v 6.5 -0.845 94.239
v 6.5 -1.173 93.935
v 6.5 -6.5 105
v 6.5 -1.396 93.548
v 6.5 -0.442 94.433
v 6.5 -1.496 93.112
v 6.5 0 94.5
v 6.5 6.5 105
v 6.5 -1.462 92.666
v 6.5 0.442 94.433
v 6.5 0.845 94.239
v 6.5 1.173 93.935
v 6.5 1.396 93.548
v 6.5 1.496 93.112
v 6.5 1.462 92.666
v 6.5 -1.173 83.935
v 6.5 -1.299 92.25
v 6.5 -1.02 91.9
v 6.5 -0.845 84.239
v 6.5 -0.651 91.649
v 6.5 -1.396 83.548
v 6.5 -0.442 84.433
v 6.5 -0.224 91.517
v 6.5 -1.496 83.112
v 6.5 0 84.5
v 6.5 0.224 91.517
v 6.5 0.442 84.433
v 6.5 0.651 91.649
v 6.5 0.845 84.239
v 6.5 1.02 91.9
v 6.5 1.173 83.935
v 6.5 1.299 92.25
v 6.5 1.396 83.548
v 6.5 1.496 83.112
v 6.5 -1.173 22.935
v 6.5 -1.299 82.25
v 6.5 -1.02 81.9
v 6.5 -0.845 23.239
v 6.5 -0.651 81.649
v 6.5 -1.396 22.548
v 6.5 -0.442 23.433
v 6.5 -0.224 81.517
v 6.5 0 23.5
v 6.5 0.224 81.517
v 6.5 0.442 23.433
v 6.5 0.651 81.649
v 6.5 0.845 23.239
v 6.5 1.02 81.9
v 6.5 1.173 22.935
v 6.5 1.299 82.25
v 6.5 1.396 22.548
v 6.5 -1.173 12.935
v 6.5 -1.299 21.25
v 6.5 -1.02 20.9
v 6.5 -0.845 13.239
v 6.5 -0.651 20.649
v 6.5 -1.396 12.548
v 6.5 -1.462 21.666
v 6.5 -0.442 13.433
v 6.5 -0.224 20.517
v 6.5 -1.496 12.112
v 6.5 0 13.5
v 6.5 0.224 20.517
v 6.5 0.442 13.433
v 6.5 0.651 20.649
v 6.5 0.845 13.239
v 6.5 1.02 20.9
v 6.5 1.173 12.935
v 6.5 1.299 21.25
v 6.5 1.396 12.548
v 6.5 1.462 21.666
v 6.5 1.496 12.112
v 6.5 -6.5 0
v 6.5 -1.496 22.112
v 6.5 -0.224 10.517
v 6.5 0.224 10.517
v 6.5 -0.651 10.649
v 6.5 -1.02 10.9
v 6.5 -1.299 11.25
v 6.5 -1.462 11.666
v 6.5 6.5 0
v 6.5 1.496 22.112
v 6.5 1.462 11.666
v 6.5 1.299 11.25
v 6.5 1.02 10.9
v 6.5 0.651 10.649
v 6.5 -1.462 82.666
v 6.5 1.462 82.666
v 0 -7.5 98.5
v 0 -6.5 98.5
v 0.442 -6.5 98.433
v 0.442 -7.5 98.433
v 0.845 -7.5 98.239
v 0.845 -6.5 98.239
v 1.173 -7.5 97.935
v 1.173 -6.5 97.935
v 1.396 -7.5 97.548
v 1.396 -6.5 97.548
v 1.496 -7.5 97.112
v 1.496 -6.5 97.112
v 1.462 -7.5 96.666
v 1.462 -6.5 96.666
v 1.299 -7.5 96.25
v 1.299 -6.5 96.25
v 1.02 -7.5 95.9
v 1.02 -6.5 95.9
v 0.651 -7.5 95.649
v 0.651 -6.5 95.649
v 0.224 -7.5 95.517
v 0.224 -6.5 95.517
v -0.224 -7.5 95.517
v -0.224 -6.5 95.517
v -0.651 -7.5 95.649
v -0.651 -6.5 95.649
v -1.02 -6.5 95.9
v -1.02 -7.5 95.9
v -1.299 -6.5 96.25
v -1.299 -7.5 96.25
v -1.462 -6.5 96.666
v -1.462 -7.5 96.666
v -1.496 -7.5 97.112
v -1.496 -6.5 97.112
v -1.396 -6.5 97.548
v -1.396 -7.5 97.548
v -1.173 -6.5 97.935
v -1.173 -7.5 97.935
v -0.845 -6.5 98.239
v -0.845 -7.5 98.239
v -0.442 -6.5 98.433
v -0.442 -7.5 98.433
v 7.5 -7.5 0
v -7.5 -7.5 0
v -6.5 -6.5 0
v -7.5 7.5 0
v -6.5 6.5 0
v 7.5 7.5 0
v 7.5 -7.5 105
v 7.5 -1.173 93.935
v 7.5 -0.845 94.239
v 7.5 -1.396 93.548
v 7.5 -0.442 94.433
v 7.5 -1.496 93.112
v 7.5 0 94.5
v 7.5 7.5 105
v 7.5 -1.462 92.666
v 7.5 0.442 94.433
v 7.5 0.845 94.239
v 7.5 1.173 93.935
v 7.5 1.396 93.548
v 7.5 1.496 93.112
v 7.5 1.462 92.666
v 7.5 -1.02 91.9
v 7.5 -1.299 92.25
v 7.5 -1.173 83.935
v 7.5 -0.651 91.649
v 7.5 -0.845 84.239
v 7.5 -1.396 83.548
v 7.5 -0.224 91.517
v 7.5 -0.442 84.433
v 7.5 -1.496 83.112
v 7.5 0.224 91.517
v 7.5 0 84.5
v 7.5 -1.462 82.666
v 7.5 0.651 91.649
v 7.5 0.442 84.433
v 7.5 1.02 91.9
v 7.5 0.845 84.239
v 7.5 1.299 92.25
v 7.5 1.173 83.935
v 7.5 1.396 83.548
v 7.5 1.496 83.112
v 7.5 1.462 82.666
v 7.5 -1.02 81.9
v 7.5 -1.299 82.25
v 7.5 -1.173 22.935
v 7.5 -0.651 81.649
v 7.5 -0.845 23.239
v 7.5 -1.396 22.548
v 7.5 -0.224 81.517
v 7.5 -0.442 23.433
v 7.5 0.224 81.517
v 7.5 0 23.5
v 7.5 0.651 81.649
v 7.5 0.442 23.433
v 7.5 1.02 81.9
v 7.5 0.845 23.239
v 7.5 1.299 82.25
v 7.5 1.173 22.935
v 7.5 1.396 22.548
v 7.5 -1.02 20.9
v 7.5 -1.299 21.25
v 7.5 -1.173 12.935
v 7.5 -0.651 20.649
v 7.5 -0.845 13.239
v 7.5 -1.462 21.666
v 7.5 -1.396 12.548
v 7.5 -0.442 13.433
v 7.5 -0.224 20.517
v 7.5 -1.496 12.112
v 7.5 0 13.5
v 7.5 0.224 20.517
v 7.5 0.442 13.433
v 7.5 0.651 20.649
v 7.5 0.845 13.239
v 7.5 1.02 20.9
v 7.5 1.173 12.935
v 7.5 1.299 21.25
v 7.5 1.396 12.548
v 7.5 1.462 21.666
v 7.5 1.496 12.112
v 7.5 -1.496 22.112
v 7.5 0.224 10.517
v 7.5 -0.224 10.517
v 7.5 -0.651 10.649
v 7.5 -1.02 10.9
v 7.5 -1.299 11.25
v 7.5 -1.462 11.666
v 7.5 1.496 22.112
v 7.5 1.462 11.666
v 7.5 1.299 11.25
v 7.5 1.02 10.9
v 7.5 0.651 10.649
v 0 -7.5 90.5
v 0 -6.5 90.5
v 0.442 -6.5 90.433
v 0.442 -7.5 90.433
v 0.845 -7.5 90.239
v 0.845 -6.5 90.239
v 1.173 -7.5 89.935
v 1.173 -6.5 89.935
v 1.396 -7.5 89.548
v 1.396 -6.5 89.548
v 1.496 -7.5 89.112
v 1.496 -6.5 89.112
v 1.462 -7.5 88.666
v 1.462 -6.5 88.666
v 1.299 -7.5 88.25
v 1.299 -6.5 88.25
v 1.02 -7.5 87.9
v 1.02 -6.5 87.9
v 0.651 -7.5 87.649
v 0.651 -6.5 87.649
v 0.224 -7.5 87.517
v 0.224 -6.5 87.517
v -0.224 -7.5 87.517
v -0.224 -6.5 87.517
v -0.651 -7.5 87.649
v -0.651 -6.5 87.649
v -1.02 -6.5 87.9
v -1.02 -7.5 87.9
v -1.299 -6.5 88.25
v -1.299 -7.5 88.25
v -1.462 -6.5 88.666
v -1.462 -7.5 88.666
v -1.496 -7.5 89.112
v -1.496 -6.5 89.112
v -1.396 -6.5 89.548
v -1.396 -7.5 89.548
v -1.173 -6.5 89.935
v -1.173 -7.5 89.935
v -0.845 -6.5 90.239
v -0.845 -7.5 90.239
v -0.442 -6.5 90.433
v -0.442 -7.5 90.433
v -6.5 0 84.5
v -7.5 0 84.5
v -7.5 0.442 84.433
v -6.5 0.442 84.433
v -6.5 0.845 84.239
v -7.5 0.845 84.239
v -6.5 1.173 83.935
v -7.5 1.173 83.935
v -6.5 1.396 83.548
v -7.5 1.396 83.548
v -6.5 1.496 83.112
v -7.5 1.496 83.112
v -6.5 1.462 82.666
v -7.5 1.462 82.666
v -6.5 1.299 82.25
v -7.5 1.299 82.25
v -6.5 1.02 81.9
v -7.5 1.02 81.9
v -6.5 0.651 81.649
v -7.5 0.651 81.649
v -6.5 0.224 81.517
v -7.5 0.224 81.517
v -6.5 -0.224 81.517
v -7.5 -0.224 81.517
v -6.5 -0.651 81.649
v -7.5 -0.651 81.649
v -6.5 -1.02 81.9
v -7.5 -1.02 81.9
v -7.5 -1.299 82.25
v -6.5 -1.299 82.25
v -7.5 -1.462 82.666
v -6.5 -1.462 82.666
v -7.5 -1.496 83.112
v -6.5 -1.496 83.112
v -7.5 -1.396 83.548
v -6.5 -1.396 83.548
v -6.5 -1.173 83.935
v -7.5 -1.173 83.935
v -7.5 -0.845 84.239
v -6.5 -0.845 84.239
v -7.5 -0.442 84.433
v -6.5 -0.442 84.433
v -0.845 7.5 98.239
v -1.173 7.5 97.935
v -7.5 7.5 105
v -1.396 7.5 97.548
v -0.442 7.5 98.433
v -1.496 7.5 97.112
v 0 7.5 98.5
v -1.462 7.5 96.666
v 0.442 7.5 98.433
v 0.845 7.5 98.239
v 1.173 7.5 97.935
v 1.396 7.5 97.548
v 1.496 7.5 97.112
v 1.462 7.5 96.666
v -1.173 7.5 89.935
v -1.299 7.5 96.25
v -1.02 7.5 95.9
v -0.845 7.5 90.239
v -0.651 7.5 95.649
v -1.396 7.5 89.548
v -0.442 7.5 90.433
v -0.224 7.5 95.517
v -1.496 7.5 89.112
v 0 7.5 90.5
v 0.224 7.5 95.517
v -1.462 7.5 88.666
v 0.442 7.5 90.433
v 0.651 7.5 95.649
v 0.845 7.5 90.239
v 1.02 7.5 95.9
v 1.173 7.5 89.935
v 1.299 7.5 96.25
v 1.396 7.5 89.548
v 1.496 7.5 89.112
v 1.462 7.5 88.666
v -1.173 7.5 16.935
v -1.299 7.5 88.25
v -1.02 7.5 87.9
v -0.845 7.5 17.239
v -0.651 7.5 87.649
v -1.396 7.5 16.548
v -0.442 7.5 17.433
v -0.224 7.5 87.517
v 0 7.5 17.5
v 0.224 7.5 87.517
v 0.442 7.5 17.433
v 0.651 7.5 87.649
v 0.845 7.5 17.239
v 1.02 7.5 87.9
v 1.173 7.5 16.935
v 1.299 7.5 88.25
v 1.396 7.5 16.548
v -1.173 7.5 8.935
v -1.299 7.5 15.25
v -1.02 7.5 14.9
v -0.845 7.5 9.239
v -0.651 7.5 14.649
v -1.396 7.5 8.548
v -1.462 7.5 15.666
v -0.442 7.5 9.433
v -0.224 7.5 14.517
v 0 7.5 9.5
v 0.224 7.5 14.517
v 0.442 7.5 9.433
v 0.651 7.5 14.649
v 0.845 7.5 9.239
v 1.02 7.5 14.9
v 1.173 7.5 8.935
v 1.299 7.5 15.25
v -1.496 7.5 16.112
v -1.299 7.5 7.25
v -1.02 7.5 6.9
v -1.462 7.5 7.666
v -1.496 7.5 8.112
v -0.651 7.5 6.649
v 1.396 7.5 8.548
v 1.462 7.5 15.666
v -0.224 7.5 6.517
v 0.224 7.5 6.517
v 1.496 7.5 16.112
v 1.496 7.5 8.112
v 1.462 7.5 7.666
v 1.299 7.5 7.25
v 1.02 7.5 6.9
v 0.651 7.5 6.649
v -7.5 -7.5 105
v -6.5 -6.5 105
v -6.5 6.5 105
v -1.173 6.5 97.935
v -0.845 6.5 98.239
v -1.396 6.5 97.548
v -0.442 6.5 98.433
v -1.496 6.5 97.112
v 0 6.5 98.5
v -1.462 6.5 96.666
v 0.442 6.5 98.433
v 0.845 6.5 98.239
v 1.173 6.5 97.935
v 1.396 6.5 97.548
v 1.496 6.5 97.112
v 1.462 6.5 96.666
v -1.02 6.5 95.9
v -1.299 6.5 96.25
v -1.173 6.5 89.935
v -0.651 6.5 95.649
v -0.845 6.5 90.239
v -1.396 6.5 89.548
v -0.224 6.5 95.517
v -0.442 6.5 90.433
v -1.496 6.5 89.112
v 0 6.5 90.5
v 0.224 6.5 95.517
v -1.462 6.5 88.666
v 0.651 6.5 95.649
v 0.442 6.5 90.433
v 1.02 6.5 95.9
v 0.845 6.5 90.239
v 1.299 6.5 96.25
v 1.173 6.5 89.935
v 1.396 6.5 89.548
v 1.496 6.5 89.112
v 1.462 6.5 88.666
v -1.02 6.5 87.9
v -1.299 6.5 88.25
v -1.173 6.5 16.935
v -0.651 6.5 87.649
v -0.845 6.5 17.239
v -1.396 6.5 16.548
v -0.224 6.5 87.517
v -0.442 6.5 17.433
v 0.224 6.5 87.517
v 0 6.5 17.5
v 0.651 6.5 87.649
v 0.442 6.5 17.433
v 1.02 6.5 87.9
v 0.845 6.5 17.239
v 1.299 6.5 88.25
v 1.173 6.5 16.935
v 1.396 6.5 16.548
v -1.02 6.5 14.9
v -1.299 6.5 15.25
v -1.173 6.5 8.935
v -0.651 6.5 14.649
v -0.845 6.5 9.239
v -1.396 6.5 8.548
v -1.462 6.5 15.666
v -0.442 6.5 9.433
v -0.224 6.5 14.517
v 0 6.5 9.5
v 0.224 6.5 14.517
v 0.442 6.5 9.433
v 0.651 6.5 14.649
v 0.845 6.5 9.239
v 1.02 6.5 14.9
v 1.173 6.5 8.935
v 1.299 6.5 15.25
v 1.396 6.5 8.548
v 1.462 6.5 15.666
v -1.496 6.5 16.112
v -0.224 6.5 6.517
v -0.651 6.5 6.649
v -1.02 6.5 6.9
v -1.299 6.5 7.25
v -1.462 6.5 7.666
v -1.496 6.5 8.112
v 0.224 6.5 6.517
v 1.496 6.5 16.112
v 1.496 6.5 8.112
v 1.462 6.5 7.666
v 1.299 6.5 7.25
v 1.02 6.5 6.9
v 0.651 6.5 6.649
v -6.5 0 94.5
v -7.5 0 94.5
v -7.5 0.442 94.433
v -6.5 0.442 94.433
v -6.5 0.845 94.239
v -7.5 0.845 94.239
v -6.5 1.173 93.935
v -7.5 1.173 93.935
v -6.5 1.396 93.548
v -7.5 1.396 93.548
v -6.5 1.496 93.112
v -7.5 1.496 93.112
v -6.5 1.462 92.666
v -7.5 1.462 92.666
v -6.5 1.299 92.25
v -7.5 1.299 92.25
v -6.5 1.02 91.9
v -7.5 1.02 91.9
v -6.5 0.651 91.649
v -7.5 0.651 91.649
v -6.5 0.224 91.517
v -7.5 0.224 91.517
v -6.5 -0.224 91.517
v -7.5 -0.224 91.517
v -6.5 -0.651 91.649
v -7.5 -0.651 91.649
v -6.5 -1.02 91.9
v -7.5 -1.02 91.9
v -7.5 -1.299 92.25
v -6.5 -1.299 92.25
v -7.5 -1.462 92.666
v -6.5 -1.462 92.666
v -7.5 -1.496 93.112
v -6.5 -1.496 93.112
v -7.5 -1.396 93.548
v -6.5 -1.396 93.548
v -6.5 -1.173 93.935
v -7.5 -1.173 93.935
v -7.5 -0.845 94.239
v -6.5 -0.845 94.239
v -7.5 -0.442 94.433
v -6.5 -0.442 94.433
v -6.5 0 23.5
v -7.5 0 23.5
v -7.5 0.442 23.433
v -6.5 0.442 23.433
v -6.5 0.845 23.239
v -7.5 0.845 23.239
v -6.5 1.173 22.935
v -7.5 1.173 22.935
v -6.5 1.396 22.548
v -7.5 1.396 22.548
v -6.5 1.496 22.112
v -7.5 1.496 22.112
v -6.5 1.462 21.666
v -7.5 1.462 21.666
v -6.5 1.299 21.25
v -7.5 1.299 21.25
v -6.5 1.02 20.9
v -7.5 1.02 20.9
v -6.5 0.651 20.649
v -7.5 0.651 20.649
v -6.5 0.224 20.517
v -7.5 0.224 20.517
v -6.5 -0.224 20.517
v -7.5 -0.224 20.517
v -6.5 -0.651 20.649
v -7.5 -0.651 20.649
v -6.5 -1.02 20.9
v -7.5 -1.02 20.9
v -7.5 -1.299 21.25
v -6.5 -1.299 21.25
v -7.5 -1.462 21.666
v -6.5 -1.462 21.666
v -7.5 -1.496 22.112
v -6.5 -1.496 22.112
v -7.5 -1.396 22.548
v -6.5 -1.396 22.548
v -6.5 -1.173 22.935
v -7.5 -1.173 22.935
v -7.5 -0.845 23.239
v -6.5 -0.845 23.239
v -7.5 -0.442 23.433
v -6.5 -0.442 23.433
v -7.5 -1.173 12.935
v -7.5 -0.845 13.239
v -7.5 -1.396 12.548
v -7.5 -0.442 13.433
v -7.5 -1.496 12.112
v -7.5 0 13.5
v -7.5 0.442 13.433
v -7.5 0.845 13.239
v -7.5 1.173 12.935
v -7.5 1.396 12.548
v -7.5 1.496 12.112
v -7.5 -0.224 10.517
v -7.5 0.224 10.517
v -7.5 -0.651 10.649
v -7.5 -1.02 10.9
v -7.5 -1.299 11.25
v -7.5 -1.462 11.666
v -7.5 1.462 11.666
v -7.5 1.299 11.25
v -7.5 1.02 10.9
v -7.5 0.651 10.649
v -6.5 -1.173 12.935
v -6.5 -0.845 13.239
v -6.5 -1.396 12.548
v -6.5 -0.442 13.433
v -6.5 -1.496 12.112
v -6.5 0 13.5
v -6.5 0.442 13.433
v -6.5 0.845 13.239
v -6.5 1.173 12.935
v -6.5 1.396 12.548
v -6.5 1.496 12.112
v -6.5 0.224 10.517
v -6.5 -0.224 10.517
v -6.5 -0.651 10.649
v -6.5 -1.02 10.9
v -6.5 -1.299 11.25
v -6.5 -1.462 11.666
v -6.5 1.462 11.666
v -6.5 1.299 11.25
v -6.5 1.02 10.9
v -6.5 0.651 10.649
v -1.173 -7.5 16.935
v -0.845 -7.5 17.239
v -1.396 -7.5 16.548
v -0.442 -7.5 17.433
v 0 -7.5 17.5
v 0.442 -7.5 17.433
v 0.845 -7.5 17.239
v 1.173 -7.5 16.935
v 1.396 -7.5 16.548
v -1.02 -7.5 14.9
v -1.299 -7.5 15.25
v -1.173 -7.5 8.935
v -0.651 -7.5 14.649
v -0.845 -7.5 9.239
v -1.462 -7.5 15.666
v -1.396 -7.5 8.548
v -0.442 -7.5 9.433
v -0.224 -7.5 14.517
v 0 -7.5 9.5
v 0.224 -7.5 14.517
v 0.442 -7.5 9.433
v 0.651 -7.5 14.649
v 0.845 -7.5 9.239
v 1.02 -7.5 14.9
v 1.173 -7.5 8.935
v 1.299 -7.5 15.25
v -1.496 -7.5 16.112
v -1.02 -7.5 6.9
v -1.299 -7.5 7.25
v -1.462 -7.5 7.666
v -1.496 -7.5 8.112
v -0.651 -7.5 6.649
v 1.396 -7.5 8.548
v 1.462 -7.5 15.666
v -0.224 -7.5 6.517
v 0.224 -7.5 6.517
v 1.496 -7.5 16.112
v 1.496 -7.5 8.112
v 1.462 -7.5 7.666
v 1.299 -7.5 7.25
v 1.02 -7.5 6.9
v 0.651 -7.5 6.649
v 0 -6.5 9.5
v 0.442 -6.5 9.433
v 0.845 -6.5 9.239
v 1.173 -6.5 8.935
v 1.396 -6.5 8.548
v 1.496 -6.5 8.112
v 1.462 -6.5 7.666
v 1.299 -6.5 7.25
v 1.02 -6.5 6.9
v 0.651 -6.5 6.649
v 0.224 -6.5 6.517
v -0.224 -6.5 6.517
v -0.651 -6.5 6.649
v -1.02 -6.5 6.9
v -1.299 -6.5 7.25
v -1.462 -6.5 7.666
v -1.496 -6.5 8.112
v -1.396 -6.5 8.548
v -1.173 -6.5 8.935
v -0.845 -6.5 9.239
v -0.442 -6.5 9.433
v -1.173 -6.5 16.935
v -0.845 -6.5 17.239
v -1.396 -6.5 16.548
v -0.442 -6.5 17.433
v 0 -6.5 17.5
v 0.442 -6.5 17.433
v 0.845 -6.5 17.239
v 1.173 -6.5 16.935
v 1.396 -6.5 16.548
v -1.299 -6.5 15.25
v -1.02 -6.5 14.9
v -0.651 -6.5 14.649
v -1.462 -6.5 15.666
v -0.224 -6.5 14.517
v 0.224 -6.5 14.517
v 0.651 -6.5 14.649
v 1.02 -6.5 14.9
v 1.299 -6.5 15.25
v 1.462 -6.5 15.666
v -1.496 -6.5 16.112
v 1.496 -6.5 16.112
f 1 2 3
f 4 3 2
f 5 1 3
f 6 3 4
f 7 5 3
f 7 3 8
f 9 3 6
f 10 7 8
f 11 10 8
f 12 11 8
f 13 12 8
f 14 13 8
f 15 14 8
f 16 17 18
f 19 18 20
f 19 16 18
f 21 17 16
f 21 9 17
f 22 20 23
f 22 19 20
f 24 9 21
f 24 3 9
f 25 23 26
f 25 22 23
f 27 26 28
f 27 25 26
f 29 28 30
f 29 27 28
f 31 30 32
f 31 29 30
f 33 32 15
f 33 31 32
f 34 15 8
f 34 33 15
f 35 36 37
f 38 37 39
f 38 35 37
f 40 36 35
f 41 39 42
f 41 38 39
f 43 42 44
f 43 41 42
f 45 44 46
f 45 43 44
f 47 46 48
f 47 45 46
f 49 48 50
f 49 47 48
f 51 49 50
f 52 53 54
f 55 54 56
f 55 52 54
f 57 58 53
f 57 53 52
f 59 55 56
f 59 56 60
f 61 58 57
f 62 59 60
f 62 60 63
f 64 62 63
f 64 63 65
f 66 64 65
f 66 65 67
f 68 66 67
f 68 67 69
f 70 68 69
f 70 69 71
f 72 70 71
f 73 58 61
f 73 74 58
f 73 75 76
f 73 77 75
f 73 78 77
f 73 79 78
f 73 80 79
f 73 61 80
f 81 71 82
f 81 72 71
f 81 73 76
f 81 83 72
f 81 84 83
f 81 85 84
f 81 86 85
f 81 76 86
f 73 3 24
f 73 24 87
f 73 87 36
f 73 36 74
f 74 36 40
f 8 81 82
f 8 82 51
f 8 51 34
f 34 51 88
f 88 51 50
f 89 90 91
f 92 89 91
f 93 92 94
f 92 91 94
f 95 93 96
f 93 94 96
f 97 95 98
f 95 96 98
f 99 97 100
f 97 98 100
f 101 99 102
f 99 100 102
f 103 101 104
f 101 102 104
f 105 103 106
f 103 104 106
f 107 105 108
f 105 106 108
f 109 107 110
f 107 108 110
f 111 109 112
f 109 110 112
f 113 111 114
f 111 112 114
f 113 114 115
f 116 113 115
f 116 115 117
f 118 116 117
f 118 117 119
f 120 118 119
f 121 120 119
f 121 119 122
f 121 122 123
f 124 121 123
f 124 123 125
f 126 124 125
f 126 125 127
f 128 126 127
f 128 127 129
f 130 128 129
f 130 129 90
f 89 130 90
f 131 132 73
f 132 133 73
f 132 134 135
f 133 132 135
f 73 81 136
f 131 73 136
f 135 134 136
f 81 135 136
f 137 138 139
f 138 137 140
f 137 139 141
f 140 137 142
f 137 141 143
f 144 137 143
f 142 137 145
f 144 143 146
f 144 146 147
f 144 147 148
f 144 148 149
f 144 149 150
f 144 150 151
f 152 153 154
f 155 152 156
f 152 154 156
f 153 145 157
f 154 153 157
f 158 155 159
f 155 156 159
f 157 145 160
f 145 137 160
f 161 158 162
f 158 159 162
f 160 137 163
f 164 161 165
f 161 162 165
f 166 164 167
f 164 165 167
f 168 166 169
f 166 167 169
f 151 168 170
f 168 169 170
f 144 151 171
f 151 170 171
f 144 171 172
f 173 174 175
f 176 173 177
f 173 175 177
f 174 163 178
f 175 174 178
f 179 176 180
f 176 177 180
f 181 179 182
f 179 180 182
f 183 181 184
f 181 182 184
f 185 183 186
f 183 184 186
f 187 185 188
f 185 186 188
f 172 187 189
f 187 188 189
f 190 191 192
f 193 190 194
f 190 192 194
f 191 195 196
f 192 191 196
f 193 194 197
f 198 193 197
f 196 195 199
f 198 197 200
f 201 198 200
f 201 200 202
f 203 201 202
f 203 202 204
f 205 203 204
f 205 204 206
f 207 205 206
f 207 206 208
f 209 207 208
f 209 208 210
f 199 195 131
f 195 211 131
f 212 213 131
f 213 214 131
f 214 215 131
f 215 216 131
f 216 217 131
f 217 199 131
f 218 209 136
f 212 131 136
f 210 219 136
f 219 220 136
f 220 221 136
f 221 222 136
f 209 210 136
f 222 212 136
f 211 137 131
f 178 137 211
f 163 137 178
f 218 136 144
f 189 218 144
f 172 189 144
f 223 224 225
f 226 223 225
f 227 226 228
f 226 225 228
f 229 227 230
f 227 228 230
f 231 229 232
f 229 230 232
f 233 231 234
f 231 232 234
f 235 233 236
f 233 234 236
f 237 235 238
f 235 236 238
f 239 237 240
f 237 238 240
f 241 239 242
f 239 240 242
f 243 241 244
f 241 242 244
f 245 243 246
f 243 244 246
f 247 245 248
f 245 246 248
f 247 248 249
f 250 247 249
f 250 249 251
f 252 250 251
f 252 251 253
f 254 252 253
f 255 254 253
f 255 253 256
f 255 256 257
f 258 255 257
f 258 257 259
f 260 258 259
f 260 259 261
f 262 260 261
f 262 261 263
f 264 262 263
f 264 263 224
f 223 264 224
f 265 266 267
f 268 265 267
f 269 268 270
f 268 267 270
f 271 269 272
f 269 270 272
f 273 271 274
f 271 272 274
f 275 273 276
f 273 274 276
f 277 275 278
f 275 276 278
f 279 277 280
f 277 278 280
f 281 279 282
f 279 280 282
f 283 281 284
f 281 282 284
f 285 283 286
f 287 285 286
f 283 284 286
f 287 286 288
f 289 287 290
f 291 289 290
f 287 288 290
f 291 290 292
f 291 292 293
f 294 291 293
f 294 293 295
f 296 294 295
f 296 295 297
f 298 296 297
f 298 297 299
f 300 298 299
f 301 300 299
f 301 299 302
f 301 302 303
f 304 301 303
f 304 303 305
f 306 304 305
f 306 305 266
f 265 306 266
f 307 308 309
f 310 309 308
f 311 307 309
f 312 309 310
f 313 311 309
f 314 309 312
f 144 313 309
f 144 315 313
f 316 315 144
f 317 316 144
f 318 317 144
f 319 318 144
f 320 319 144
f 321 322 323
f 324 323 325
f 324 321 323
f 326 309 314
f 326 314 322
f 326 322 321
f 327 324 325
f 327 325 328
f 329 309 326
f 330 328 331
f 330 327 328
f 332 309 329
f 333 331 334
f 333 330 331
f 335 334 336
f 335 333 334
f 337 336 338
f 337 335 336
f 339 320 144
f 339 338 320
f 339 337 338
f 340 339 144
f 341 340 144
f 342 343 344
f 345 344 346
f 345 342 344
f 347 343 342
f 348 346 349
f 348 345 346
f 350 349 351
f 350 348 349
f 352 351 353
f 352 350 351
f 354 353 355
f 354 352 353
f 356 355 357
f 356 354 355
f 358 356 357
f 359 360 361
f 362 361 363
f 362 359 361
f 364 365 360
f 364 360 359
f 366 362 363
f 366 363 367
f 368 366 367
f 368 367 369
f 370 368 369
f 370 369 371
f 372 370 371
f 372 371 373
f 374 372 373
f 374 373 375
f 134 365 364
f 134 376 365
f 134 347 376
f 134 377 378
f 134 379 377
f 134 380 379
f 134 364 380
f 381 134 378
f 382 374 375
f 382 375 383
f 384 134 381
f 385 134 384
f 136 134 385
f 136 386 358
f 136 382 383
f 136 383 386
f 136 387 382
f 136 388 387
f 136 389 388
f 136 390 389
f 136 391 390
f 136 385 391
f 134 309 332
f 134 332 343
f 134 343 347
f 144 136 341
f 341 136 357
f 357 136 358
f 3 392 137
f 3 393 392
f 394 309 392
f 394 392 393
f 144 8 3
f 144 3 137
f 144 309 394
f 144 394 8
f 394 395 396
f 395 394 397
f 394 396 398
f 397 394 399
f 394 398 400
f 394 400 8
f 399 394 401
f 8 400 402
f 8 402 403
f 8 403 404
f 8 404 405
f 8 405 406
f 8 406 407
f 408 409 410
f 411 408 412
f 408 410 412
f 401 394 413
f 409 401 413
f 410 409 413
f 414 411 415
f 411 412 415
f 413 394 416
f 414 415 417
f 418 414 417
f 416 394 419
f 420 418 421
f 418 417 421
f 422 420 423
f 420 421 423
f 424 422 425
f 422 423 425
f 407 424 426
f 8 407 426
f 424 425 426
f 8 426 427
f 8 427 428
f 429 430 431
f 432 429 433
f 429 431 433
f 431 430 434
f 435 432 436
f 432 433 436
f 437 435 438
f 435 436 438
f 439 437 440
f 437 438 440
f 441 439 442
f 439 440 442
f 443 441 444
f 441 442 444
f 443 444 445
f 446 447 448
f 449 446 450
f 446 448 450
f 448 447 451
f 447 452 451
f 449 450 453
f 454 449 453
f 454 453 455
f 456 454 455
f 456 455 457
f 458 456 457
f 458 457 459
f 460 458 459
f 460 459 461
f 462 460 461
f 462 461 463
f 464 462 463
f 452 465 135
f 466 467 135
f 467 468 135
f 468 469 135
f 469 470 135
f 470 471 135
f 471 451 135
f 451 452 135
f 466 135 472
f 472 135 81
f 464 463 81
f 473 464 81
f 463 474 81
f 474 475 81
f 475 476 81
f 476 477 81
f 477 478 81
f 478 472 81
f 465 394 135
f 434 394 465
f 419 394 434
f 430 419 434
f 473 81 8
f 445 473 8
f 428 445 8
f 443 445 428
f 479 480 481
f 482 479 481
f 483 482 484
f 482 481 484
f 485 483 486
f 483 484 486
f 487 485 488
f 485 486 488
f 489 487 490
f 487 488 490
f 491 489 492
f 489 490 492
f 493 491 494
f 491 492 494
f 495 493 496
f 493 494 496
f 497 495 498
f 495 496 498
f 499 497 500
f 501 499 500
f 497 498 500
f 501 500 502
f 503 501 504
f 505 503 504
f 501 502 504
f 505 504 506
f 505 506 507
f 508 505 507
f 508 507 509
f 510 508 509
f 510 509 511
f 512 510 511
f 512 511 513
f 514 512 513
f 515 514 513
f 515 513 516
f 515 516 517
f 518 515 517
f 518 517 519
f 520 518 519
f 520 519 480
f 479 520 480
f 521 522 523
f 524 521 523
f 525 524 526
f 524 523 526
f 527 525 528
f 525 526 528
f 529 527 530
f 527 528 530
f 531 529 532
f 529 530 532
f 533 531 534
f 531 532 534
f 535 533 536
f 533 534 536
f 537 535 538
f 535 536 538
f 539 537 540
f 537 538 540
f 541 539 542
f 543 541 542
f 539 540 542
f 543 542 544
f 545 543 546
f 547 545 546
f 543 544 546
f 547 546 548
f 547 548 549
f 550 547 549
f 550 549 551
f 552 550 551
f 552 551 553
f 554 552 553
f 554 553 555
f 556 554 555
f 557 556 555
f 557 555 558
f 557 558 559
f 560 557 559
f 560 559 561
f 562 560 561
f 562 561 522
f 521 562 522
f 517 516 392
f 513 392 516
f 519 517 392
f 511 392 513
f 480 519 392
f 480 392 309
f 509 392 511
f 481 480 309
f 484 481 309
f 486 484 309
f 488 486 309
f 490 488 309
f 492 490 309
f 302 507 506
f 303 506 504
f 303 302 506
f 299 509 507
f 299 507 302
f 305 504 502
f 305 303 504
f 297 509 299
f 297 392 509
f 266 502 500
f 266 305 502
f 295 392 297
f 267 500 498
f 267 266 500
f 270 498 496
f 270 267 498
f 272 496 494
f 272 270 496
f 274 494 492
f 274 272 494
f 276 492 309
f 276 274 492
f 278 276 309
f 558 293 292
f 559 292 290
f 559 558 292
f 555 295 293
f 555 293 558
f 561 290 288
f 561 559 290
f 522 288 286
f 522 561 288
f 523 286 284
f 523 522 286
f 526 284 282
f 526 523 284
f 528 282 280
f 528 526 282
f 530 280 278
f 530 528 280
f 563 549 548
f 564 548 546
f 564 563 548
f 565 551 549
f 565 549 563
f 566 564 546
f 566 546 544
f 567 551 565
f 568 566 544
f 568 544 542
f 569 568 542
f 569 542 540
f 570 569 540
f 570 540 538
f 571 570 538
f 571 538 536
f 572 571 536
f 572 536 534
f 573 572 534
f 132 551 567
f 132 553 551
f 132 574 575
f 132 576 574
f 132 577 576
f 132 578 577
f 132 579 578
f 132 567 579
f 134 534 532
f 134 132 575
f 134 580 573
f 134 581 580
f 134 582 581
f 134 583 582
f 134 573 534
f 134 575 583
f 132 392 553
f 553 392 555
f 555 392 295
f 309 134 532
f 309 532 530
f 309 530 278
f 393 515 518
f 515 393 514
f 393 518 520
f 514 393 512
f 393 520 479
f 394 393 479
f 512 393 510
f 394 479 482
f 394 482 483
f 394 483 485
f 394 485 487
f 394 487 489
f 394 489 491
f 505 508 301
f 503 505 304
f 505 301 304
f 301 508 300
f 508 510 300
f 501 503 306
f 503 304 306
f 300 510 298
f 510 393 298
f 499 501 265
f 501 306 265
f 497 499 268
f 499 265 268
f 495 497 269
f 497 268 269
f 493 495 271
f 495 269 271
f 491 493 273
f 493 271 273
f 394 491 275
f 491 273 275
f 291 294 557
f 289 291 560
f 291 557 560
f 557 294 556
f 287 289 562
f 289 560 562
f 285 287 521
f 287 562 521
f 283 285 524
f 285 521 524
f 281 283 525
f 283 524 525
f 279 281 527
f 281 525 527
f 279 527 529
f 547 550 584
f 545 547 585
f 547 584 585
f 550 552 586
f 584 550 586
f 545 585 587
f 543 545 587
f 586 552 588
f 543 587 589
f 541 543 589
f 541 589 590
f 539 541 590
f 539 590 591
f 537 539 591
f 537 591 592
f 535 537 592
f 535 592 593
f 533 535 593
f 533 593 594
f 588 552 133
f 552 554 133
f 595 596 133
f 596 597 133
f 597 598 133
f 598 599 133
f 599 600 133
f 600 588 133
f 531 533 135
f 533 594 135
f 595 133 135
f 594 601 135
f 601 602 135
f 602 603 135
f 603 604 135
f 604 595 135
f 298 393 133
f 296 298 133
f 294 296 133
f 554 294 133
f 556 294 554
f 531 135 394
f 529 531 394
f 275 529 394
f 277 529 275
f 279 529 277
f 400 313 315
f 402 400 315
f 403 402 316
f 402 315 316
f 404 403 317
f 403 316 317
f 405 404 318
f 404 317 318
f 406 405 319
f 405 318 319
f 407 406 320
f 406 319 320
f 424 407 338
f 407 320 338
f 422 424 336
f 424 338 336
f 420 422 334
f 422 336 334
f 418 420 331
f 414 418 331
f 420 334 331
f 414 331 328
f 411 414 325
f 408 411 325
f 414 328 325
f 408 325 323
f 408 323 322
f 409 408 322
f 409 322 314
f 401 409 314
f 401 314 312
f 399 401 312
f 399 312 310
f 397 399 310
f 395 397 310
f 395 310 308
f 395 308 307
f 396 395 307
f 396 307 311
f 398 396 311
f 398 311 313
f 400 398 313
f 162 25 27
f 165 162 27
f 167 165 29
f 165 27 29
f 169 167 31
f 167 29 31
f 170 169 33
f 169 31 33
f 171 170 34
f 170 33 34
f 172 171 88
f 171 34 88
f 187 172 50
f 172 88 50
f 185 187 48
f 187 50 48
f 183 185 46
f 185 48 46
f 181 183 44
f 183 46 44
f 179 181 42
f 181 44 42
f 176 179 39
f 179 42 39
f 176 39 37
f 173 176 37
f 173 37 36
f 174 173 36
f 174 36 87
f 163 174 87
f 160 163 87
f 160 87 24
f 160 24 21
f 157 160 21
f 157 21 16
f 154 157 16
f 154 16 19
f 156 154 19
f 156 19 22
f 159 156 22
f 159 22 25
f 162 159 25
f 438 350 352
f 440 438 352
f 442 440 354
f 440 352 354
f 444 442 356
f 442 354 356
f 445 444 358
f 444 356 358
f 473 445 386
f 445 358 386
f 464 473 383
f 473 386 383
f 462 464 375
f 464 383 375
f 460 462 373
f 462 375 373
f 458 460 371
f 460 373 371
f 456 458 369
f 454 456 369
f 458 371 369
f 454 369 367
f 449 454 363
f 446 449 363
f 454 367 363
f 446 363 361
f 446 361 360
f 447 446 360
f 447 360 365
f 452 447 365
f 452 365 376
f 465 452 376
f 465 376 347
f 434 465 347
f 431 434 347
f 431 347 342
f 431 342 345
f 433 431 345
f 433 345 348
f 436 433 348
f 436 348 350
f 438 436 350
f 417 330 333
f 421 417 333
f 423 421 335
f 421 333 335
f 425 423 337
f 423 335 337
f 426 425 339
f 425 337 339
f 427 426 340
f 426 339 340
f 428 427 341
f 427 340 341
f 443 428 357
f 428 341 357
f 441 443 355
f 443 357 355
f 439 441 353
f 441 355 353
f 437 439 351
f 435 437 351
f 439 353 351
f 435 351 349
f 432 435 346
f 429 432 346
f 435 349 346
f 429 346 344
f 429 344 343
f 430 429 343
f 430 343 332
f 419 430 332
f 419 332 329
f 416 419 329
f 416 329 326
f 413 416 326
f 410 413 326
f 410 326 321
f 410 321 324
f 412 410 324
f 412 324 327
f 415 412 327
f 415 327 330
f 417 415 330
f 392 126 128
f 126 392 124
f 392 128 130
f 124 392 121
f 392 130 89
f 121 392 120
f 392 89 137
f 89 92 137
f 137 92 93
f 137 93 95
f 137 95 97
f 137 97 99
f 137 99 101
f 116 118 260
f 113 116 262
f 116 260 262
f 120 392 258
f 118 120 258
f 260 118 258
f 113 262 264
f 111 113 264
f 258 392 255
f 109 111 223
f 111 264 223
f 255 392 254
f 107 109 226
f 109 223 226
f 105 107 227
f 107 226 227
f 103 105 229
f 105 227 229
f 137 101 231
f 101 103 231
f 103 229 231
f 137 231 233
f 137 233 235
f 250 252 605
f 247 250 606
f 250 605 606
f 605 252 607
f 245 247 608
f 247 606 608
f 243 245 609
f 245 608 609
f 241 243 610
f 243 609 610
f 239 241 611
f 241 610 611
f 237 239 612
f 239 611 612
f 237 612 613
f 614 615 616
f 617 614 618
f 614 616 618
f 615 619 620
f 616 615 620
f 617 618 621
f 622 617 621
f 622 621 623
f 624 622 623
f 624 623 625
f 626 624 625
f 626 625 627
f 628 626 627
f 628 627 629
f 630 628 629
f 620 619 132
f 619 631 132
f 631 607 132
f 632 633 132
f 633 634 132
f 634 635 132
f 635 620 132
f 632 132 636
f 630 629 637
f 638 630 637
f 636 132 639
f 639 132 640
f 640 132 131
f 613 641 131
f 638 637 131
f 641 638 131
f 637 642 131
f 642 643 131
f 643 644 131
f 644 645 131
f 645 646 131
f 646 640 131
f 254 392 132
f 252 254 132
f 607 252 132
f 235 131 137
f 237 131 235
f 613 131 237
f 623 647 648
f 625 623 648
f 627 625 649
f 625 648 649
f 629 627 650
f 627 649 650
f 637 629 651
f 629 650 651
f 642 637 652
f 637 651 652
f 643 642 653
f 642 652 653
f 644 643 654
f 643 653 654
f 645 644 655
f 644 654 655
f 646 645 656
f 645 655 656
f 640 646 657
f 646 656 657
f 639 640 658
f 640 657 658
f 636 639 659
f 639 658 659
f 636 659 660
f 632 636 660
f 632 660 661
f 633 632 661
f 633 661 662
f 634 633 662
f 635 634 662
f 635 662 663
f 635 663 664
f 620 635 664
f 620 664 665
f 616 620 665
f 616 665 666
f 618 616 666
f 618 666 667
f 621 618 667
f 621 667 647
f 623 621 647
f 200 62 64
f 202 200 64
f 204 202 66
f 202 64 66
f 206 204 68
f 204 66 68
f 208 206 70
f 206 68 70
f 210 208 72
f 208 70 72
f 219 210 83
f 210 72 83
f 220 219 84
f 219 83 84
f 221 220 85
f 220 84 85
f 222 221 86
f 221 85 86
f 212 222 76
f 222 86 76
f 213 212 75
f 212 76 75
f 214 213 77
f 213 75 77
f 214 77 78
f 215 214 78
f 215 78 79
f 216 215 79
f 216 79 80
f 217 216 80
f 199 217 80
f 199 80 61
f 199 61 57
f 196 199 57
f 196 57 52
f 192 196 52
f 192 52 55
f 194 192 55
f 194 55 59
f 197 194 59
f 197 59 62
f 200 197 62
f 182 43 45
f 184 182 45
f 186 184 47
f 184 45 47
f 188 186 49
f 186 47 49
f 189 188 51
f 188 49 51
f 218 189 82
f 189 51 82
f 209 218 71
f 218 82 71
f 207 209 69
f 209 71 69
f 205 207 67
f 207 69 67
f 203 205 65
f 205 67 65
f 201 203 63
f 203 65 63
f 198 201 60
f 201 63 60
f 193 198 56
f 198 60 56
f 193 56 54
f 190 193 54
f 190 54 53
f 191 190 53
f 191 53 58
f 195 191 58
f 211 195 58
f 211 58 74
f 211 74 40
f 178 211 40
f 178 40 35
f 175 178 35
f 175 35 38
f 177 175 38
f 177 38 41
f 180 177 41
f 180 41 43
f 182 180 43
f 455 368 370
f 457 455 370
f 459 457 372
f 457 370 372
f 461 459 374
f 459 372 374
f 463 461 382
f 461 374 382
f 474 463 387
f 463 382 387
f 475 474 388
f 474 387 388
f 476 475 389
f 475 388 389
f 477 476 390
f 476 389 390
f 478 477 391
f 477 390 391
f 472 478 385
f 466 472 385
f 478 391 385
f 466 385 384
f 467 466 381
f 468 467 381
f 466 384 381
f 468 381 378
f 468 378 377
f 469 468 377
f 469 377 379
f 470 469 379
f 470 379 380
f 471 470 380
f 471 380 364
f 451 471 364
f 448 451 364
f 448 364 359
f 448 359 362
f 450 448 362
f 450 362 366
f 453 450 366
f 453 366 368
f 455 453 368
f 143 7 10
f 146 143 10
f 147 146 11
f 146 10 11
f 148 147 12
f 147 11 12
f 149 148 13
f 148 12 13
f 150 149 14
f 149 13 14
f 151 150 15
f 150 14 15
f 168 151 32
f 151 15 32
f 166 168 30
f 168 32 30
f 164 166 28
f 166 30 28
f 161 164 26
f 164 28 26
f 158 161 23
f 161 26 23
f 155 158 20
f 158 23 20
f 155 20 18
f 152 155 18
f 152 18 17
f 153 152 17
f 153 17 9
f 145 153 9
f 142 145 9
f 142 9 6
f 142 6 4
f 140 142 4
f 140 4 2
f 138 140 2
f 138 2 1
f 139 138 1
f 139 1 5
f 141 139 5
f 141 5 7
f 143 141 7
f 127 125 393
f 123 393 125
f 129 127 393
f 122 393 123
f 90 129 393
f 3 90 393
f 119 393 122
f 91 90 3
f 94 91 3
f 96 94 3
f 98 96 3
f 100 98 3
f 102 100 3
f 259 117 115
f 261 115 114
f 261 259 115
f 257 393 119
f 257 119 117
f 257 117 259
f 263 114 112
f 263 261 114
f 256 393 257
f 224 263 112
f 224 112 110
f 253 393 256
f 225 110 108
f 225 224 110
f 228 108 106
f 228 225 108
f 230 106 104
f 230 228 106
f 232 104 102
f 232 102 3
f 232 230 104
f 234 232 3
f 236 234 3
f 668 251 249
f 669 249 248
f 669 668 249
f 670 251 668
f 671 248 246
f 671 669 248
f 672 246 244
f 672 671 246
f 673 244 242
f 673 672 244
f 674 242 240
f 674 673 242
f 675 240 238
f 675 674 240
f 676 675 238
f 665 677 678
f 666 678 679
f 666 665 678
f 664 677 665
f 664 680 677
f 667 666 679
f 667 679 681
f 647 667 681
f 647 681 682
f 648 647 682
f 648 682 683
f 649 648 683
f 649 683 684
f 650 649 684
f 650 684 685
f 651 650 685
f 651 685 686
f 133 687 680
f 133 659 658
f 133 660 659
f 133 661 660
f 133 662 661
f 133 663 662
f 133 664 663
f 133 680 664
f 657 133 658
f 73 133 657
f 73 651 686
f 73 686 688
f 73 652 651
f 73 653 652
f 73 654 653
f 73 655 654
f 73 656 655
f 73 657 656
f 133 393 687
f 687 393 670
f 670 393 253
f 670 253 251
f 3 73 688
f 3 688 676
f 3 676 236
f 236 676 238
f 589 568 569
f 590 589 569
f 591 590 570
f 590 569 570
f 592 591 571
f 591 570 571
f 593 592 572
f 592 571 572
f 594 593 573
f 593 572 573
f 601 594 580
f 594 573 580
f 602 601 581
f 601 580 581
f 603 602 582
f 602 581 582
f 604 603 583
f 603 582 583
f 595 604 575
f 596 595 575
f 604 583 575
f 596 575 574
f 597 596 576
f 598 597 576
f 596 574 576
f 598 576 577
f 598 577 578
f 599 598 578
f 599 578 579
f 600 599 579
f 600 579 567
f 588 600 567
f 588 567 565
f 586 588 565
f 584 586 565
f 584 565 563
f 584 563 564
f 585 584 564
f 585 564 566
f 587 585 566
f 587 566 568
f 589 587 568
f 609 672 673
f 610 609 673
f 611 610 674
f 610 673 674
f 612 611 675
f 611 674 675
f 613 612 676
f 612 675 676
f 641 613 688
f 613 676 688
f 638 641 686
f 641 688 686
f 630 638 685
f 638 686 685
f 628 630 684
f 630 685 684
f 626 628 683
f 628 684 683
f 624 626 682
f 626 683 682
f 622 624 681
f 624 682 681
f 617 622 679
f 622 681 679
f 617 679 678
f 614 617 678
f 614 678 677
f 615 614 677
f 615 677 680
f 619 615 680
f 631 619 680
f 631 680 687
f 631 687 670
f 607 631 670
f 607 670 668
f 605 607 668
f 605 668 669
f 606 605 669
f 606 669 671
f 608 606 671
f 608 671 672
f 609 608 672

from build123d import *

# Parameters (mm, degrees)
SKETCH_1_W          = 15
SKETCH_1_H          = 15
SKETCH_1_W_2        = 13
SKETCH_1_H_2        = 13
EXTRUDE_1_DEPTH     = 105
SKETCH_3_R          = 1.5
CUT_EXTRUDE_2_DEPTH = 107.330851591
SKETCH_4_R          = 1.5
CUT_EXTRUDE_3_DEPTH = 107.330851591


with BuildPart() as part:
    # 草图1 → 凸台-拉伸1 (new body)
    with BuildSketch(Plane.XY):
        Rectangle(SKETCH_1_W, SKETCH_1_H)
        Rectangle(SKETCH_1_W_2, SKETCH_1_H_2, mode=Mode.SUBTRACT)
    extrude(amount=EXTRUDE_1_DEPTH)

    # 草图3 → 切除-拉伸2 (cut, through all)
    with BuildSketch(Plane(origin=(0, 7.5, 0), x_dir=(1, 0, 0), z_dir=(0, 1, 0))):
        with Locations(Location((0, -97, 0), (0, 0, 270))):
            Circle(SKETCH_3_R)
        with Locations(Location((0, -89, 0), (0, 0, 270))):
            Circle(SKETCH_3_R)
        with Locations(Location((0, -16, 0), (0, 0, 270))):
            Circle(SKETCH_3_R)
        with Locations(Location((0, -8, 0), (0, 0, 270))):
            Circle(SKETCH_3_R)
    extrude(amount=-CUT_EXTRUDE_2_DEPTH, mode=Mode.SUBTRACT)

    # 草图4 → 切除-拉伸3 (cut, through all)
    with BuildSketch(Plane.ZY.offset(7.5)):
        with Locations((93, 0)):
            Circle(SKETCH_4_R)
        with Locations((83, 0)):
            Circle(SKETCH_4_R)
        with Locations((12, 0)):
            Circle(SKETCH_4_R)
        with Locations((22, 0)):
            Circle(SKETCH_4_R)
    extrude(amount=-CUT_EXTRUDE_3_DEPTH, mode=Mode.SUBTRACT)


solid = part.part
